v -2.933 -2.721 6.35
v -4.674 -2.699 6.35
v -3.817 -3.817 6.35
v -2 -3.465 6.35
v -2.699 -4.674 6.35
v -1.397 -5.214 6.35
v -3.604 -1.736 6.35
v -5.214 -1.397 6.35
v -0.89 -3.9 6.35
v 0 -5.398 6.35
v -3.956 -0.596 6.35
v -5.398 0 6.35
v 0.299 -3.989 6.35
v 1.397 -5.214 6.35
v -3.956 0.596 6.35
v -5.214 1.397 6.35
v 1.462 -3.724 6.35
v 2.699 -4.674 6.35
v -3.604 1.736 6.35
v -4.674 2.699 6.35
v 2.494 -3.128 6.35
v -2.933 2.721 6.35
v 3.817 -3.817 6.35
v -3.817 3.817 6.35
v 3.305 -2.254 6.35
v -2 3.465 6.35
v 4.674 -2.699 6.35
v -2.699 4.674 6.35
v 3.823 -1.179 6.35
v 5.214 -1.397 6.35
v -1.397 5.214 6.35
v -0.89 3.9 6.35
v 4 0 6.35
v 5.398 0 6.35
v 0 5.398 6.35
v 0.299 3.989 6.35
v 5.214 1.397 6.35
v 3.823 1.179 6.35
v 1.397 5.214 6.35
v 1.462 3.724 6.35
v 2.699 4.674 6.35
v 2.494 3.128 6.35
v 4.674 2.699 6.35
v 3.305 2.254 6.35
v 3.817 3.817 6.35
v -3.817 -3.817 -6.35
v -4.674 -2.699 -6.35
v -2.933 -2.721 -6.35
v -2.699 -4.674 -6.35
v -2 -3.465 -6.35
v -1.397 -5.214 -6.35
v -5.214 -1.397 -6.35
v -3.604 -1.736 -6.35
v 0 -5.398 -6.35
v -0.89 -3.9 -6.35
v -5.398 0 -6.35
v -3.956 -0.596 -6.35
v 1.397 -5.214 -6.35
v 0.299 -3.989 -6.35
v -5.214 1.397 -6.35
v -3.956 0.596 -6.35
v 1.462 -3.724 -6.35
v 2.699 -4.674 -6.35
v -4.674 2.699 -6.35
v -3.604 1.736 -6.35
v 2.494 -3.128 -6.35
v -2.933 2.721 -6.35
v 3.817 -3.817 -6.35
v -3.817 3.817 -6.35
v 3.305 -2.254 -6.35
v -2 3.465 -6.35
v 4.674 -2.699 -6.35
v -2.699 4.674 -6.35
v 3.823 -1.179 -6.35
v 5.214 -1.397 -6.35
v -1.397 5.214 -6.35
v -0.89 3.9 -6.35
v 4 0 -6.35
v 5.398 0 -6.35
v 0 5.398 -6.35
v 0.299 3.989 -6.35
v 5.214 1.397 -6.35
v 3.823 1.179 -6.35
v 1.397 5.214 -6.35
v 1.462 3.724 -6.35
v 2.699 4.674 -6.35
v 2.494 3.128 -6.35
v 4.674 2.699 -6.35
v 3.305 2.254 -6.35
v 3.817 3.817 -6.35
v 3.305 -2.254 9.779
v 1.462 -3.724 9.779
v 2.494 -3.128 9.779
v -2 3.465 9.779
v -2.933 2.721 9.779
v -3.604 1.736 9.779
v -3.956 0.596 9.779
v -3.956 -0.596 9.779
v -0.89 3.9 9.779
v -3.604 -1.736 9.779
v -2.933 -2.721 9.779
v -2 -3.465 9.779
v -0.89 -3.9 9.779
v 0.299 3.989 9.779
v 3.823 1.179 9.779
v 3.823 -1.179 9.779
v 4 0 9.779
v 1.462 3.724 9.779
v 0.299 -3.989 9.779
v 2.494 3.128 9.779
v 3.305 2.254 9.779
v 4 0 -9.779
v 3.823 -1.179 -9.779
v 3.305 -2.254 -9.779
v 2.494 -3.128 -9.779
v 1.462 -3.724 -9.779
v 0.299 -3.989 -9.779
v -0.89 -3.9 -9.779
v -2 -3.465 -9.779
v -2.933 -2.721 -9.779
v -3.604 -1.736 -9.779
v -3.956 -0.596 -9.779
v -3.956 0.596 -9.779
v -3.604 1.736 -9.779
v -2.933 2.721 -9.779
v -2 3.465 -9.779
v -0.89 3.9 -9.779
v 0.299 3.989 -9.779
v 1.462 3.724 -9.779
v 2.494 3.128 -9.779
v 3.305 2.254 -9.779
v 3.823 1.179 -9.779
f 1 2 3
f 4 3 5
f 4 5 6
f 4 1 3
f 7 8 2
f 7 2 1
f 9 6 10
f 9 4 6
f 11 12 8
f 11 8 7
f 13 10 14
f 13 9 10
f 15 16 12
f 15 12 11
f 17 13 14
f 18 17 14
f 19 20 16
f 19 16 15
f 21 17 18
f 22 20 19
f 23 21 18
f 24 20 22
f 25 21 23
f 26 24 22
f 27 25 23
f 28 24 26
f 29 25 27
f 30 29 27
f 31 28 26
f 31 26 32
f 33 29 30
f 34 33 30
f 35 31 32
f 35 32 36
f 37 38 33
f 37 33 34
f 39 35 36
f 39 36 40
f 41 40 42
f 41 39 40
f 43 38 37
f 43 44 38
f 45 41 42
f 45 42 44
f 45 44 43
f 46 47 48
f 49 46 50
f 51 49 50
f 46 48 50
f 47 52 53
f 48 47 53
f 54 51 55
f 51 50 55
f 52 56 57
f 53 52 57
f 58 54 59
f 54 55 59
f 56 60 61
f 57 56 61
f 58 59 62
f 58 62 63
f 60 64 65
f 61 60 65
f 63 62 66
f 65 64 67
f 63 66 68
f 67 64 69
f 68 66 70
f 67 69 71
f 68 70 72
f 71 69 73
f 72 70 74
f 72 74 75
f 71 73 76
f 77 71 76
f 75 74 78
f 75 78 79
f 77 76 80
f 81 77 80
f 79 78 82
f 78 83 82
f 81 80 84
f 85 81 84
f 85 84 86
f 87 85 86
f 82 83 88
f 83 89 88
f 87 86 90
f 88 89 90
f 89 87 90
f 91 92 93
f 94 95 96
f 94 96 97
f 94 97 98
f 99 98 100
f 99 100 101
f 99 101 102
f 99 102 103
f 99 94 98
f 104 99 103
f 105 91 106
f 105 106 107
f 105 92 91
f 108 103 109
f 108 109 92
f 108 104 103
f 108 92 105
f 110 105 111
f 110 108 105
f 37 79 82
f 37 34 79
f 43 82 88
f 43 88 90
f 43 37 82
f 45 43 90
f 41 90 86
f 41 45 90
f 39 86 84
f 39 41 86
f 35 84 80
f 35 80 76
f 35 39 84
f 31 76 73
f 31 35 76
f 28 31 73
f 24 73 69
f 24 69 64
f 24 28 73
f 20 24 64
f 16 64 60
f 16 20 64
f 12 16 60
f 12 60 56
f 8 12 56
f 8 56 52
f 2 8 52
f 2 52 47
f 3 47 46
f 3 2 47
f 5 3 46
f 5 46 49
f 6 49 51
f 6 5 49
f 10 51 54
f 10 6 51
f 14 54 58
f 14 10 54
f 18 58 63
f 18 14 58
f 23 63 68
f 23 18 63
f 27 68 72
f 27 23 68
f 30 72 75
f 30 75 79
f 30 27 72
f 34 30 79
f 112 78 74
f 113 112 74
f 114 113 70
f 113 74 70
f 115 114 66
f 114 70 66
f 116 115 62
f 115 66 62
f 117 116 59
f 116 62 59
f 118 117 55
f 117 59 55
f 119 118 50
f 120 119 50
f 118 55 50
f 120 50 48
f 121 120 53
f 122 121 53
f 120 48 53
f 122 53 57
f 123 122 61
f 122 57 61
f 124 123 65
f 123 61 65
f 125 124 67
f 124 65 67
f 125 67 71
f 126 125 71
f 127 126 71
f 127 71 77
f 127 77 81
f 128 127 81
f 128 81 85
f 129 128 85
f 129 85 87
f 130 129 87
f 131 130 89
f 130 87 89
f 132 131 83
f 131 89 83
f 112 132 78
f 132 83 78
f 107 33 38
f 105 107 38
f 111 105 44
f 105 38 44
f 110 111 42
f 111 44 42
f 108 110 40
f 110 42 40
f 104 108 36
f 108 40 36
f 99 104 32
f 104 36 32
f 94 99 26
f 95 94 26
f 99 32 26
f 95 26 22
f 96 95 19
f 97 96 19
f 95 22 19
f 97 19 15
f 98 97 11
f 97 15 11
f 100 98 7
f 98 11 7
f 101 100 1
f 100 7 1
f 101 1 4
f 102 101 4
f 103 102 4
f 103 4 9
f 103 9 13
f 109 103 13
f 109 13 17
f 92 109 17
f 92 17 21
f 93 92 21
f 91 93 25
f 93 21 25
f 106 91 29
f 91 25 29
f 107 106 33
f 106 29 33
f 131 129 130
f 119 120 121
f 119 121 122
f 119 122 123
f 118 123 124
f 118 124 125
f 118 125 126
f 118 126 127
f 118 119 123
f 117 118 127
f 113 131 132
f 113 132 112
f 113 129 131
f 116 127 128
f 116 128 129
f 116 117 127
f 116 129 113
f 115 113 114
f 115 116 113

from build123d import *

# Parameters (mm, degrees)
F0_R     = 5.3975
F1_DEPTH = 6.35
F2_R     = 4.0005
F3_DEPTH = 3.429
F4_R     = 4.0005
F5_DEPTH = 3.429


with BuildPart() as f1:
    # F0 (on Top) → F1 (new body, symmetric)
    with BuildSketch(Plane.XY):
        Circle(F0_R)
    extrude(amount=F1_DEPTH, both=True)

    # F2 (on face) → F3 (join)
    with BuildSketch(Plane(origin=(0, 0, -6.35), x_dir=(1, 0, 0), z_dir=(0, 0, -1))):
        Circle(F2_R)
    extrude(amount=F3_DEPTH)

    # F4 (on face) → F5 (join)
    with BuildSketch(Plane.XY.offset(6.35)):
        Circle(F4_R)
    extrude(amount=F5_DEPTH)


solid = f1.part
